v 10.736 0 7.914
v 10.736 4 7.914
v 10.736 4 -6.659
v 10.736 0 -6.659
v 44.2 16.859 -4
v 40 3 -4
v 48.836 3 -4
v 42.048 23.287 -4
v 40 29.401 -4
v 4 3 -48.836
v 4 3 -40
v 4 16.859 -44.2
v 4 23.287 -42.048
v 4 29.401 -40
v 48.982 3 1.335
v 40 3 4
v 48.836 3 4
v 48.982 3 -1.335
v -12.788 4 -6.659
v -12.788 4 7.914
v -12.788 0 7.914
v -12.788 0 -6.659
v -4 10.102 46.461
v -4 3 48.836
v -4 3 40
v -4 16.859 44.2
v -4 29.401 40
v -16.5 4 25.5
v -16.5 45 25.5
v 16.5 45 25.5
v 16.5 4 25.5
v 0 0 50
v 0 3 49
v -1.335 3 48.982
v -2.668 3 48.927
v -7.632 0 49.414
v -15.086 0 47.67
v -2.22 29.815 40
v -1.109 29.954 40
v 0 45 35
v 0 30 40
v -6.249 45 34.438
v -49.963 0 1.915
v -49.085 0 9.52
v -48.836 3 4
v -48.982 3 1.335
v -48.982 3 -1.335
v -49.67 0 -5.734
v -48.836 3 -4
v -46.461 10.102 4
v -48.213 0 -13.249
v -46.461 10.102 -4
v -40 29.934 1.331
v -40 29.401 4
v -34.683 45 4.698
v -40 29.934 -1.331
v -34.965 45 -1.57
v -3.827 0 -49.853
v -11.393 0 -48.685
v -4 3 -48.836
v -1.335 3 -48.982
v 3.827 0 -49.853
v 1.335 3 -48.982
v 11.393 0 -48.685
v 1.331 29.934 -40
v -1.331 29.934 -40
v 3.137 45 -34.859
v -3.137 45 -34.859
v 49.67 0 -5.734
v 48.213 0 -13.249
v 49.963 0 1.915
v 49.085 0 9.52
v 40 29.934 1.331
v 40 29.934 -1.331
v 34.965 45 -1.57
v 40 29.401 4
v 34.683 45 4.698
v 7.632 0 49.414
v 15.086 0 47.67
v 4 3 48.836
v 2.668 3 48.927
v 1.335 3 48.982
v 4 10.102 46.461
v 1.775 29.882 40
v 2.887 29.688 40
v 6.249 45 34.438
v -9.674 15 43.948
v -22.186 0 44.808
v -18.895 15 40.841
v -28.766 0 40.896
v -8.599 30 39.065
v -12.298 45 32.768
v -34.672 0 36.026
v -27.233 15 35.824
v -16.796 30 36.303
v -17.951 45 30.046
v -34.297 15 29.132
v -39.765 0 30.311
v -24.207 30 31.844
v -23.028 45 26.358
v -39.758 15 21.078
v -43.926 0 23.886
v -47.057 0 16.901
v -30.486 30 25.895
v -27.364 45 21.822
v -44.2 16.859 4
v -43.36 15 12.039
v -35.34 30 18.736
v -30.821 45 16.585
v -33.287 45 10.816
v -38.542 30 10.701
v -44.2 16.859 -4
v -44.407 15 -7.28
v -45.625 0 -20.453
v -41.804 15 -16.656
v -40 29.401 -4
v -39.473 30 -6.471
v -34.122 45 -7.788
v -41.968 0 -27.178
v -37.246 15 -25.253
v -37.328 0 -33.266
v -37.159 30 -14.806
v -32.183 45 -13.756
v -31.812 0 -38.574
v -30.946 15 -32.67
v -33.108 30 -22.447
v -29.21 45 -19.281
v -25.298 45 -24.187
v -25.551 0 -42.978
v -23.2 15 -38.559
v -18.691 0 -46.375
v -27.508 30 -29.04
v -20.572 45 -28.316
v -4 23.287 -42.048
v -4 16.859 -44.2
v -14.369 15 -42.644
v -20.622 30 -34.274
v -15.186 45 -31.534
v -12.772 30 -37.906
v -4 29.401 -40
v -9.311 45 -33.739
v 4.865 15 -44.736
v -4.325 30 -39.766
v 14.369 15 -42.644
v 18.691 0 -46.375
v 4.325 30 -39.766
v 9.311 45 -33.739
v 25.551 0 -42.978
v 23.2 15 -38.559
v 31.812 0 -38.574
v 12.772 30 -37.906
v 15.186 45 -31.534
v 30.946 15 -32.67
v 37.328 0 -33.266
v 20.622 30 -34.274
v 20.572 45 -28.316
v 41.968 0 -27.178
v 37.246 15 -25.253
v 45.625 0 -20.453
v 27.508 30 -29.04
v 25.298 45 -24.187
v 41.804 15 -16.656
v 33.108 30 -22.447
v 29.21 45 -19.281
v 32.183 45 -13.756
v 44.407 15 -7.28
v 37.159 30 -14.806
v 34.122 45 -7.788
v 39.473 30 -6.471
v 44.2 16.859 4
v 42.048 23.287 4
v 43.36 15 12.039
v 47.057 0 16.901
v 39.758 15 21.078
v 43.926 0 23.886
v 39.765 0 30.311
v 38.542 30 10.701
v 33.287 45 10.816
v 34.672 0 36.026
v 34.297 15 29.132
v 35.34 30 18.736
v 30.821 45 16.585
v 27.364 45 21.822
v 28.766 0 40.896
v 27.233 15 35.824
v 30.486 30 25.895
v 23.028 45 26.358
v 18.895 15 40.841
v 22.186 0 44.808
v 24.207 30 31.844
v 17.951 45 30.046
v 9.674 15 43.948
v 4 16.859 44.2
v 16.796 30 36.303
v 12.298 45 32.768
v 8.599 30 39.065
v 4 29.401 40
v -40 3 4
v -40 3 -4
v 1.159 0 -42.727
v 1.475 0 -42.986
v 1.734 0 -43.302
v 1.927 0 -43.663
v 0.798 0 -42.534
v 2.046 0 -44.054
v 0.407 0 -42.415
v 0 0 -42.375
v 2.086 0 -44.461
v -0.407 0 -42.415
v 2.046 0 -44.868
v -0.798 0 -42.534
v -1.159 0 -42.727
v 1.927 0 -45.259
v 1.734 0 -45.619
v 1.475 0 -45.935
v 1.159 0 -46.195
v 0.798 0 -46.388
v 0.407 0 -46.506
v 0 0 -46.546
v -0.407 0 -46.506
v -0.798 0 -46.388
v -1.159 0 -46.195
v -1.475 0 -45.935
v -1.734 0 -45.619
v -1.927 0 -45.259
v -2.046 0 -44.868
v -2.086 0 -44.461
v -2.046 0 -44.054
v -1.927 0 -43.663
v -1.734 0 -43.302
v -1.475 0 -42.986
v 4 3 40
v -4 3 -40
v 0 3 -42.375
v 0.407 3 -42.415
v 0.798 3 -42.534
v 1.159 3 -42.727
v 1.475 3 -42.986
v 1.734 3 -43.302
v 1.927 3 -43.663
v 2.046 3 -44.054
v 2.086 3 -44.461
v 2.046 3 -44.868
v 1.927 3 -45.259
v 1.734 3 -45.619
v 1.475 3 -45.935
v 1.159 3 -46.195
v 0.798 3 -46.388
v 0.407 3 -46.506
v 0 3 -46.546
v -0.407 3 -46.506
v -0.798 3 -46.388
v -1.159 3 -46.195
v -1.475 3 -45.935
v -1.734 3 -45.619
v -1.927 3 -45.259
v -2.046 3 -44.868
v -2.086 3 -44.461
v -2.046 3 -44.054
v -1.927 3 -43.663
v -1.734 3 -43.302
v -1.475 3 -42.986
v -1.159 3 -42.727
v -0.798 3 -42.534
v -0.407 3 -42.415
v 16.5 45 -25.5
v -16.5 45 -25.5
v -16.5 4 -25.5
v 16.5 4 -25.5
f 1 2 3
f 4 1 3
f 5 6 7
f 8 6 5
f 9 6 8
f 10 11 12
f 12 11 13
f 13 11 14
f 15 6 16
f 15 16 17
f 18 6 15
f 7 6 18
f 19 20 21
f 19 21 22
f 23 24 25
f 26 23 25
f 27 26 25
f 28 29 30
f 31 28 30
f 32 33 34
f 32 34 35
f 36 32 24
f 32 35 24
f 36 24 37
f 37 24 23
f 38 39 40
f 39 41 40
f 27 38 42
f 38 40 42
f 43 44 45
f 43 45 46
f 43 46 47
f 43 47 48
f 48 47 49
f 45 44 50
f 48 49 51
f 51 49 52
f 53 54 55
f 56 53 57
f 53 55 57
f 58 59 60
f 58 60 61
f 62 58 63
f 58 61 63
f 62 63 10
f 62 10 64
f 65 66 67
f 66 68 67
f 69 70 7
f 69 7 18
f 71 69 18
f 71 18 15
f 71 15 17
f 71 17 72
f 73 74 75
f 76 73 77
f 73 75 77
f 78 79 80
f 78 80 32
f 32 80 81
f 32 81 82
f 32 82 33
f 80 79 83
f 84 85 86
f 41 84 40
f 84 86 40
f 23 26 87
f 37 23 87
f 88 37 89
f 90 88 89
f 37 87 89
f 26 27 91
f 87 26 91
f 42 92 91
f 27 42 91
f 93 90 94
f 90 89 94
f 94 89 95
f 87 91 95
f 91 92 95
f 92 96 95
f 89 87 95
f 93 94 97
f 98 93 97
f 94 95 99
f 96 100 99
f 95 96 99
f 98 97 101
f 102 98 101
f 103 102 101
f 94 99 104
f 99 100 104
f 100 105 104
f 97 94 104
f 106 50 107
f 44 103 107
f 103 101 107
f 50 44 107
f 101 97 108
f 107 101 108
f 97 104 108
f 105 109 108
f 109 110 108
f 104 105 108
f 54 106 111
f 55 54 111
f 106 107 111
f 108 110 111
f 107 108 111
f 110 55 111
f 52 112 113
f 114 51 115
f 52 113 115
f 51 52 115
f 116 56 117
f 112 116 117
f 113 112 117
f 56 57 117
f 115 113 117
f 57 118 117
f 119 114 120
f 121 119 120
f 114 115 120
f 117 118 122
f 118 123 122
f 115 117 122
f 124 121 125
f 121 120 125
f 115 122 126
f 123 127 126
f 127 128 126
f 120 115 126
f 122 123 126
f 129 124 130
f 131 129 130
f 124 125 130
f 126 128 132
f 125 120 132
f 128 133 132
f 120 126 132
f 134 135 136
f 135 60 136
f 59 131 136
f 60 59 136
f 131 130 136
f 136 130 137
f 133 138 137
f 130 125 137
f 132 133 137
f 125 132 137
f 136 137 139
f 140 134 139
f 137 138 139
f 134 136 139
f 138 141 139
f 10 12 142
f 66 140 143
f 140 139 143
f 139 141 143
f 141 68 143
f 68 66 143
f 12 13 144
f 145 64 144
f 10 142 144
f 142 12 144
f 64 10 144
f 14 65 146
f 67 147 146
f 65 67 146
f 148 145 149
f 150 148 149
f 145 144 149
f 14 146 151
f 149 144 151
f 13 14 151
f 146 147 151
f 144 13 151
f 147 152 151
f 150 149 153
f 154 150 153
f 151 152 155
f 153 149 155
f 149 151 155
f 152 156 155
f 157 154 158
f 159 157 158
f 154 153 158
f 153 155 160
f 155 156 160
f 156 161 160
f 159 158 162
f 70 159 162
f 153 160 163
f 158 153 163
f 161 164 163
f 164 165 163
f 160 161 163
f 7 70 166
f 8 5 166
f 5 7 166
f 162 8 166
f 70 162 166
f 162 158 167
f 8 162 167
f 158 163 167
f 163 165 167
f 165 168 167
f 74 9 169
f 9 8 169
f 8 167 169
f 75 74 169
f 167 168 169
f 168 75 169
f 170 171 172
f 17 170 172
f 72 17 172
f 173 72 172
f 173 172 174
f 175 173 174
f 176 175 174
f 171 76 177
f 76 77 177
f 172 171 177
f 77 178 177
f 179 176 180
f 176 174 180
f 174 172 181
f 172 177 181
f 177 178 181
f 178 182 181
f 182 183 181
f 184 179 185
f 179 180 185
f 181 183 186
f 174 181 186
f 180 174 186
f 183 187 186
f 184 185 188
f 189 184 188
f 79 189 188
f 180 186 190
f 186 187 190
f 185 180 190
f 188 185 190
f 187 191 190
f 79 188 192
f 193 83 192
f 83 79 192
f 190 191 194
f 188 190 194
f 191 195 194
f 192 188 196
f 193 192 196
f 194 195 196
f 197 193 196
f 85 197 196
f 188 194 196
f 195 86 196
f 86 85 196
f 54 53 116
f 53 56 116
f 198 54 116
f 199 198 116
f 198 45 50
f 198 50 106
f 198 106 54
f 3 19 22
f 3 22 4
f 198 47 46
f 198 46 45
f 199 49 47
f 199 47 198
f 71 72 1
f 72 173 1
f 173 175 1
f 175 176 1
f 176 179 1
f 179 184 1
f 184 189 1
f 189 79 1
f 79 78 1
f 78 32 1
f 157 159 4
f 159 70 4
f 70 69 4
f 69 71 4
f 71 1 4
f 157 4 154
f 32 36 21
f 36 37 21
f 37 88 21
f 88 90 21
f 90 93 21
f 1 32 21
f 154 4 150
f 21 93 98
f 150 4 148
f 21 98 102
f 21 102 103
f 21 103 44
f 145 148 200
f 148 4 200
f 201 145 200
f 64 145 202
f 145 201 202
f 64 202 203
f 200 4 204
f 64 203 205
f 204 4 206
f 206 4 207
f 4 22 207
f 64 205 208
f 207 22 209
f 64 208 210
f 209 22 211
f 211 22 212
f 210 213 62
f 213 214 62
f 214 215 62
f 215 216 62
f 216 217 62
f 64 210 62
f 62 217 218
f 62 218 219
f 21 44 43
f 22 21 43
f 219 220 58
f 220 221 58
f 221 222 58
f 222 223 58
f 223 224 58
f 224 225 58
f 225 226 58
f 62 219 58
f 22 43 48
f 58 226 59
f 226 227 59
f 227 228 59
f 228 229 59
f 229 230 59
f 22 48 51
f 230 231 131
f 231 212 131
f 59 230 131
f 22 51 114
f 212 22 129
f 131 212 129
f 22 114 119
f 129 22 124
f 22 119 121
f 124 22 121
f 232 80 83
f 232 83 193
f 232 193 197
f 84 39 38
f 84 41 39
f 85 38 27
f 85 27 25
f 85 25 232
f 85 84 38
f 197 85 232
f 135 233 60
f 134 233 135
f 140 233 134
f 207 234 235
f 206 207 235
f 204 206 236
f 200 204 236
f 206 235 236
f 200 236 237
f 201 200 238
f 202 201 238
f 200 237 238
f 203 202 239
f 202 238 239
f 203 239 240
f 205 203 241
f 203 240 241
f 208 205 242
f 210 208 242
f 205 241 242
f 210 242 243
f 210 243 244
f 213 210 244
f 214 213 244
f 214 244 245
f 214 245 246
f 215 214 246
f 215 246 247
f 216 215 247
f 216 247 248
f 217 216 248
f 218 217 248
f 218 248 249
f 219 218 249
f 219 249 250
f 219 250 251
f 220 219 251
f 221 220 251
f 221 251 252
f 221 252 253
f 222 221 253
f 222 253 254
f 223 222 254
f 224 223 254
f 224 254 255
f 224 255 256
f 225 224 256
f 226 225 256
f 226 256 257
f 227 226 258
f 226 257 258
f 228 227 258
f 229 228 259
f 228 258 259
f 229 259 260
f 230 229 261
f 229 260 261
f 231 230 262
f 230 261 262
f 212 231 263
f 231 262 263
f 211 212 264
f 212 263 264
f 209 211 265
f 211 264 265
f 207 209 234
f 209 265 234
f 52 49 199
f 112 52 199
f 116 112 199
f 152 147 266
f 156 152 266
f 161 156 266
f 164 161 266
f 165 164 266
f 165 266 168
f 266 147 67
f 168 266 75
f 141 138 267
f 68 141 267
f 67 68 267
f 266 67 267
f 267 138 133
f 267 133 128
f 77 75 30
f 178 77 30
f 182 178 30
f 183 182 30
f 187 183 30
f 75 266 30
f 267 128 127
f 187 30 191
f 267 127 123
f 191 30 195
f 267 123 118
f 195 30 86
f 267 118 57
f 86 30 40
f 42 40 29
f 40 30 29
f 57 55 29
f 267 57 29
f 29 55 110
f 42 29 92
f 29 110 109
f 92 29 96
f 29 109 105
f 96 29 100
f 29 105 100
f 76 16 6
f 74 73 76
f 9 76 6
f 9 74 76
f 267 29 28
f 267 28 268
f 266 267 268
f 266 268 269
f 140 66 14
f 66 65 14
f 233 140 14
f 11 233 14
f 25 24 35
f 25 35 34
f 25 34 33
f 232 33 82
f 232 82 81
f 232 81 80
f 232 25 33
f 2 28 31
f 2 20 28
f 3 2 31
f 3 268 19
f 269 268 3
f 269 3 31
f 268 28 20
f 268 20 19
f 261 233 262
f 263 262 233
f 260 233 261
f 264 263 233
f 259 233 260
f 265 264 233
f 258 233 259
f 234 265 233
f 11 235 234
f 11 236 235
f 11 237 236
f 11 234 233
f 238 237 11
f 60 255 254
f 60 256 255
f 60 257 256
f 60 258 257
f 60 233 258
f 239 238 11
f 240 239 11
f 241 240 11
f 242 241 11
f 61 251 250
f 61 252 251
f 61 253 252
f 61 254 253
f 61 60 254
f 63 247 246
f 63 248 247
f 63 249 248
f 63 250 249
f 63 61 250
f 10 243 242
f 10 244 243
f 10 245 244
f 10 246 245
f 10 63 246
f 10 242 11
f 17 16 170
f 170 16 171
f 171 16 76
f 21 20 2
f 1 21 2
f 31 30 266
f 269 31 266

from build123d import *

# Parameters (mm, degrees)
ESQUISSE2_W             = 33
ESQUISSE2_H             = 51
ENL_V_MAT_EXTRU_1_DEPTH = 41
ESQUISSE3_W             = 8
ESQUISSE3_H             = 12
ESQUISSE3_W_2           = 12
ESQUISSE3_H_2           = 8
ENL_V_MAT_EXTRU_3_DEPTH = 42
ESQUISSE4_W             = 23.524420498
ESQUISSE4_H             = 14.572913479
ENL_V_MAT_EXTRU_4_DEPTH = 269
ESQUISSE6_R             = 2.08560847
ENL_V_MAT_EXTRU_5_DEPTH = 10


with BuildPart() as part:
    # Esquisse1 → Révolution1 (revolve)
    with BuildSketch(Plane.XY, mode=Mode.PRIVATE) as r_volution1_sk:
        Polygon((0, 0), (-50, 0), (-35, 45), (0, 45), align=None)
    revolve(r_volution1_sk.sketch.rotate(Axis((0, 185.624886126, 0), (0, -1, 0)), 270), axis=Axis((0, 185.624886126, 0), (0, -1, 0)))

    # Esquisse2 → Enlèv. mat.-Extru.1 (cut)
    with BuildSketch(Plane(origin=(0, 45, 0), x_dir=(1, 0, 0), z_dir=(0, 1, 0))):
        Rectangle(ESQUISSE2_W, ESQUISSE2_H)
    extrude(amount=-ENL_V_MAT_EXTRU_1_DEPTH, mode=Mode.SUBTRACT)

    # Esquisse3 → Enlèv. mat.-Extru.3 (cut)
    with BuildSketch(Plane(origin=(0, 45, 0), x_dir=(1, 0, 0), z_dir=(0, 1, 0))):
        with Locations((0, 46)):
            Rectangle(ESQUISSE3_W, ESQUISSE3_H)
        with Locations((46, 0)):
            Rectangle(ESQUISSE3_W_2, ESQUISSE3_H_2)
        with Locations((0, -46)):
            Rectangle(ESQUISSE3_W, ESQUISSE3_H)
        with Locations((-46, 0)):
            Rectangle(ESQUISSE3_W_2, ESQUISSE3_H_2)
    extrude(amount=-ENL_V_MAT_EXTRU_3_DEPTH, mode=Mode.SUBTRACT)

    # Esquisse4 → Enlèv. mat.-Extru.4 (cut)
    with BuildSketch(Plane(origin=(0, 4, 0), x_dir=(1, 0, 0), z_dir=(0, 1, 0))):
        with Locations((-1.026102351, -0.627863405)):
            Rectangle(ESQUISSE4_W, ESQUISSE4_H)
    extrude(amount=-ENL_V_MAT_EXTRU_4_DEPTH, mode=Mode.SUBTRACT)

    # Esquisse6 → Enlèv. mat.-Extru.5 (cut)
    with BuildSketch(Plane(origin=(0, 3, 0), x_dir=(1, 0, 0), z_dir=(0, 1, 0))):
        with Locations(Location((0, 44.460655409, 0), (0, 0, 270))):
            Circle(ESQUISSE6_R)
    extrude(amount=-ENL_V_MAT_EXTRU_5_DEPTH, mode=Mode.SUBTRACT)


solid = part.part
